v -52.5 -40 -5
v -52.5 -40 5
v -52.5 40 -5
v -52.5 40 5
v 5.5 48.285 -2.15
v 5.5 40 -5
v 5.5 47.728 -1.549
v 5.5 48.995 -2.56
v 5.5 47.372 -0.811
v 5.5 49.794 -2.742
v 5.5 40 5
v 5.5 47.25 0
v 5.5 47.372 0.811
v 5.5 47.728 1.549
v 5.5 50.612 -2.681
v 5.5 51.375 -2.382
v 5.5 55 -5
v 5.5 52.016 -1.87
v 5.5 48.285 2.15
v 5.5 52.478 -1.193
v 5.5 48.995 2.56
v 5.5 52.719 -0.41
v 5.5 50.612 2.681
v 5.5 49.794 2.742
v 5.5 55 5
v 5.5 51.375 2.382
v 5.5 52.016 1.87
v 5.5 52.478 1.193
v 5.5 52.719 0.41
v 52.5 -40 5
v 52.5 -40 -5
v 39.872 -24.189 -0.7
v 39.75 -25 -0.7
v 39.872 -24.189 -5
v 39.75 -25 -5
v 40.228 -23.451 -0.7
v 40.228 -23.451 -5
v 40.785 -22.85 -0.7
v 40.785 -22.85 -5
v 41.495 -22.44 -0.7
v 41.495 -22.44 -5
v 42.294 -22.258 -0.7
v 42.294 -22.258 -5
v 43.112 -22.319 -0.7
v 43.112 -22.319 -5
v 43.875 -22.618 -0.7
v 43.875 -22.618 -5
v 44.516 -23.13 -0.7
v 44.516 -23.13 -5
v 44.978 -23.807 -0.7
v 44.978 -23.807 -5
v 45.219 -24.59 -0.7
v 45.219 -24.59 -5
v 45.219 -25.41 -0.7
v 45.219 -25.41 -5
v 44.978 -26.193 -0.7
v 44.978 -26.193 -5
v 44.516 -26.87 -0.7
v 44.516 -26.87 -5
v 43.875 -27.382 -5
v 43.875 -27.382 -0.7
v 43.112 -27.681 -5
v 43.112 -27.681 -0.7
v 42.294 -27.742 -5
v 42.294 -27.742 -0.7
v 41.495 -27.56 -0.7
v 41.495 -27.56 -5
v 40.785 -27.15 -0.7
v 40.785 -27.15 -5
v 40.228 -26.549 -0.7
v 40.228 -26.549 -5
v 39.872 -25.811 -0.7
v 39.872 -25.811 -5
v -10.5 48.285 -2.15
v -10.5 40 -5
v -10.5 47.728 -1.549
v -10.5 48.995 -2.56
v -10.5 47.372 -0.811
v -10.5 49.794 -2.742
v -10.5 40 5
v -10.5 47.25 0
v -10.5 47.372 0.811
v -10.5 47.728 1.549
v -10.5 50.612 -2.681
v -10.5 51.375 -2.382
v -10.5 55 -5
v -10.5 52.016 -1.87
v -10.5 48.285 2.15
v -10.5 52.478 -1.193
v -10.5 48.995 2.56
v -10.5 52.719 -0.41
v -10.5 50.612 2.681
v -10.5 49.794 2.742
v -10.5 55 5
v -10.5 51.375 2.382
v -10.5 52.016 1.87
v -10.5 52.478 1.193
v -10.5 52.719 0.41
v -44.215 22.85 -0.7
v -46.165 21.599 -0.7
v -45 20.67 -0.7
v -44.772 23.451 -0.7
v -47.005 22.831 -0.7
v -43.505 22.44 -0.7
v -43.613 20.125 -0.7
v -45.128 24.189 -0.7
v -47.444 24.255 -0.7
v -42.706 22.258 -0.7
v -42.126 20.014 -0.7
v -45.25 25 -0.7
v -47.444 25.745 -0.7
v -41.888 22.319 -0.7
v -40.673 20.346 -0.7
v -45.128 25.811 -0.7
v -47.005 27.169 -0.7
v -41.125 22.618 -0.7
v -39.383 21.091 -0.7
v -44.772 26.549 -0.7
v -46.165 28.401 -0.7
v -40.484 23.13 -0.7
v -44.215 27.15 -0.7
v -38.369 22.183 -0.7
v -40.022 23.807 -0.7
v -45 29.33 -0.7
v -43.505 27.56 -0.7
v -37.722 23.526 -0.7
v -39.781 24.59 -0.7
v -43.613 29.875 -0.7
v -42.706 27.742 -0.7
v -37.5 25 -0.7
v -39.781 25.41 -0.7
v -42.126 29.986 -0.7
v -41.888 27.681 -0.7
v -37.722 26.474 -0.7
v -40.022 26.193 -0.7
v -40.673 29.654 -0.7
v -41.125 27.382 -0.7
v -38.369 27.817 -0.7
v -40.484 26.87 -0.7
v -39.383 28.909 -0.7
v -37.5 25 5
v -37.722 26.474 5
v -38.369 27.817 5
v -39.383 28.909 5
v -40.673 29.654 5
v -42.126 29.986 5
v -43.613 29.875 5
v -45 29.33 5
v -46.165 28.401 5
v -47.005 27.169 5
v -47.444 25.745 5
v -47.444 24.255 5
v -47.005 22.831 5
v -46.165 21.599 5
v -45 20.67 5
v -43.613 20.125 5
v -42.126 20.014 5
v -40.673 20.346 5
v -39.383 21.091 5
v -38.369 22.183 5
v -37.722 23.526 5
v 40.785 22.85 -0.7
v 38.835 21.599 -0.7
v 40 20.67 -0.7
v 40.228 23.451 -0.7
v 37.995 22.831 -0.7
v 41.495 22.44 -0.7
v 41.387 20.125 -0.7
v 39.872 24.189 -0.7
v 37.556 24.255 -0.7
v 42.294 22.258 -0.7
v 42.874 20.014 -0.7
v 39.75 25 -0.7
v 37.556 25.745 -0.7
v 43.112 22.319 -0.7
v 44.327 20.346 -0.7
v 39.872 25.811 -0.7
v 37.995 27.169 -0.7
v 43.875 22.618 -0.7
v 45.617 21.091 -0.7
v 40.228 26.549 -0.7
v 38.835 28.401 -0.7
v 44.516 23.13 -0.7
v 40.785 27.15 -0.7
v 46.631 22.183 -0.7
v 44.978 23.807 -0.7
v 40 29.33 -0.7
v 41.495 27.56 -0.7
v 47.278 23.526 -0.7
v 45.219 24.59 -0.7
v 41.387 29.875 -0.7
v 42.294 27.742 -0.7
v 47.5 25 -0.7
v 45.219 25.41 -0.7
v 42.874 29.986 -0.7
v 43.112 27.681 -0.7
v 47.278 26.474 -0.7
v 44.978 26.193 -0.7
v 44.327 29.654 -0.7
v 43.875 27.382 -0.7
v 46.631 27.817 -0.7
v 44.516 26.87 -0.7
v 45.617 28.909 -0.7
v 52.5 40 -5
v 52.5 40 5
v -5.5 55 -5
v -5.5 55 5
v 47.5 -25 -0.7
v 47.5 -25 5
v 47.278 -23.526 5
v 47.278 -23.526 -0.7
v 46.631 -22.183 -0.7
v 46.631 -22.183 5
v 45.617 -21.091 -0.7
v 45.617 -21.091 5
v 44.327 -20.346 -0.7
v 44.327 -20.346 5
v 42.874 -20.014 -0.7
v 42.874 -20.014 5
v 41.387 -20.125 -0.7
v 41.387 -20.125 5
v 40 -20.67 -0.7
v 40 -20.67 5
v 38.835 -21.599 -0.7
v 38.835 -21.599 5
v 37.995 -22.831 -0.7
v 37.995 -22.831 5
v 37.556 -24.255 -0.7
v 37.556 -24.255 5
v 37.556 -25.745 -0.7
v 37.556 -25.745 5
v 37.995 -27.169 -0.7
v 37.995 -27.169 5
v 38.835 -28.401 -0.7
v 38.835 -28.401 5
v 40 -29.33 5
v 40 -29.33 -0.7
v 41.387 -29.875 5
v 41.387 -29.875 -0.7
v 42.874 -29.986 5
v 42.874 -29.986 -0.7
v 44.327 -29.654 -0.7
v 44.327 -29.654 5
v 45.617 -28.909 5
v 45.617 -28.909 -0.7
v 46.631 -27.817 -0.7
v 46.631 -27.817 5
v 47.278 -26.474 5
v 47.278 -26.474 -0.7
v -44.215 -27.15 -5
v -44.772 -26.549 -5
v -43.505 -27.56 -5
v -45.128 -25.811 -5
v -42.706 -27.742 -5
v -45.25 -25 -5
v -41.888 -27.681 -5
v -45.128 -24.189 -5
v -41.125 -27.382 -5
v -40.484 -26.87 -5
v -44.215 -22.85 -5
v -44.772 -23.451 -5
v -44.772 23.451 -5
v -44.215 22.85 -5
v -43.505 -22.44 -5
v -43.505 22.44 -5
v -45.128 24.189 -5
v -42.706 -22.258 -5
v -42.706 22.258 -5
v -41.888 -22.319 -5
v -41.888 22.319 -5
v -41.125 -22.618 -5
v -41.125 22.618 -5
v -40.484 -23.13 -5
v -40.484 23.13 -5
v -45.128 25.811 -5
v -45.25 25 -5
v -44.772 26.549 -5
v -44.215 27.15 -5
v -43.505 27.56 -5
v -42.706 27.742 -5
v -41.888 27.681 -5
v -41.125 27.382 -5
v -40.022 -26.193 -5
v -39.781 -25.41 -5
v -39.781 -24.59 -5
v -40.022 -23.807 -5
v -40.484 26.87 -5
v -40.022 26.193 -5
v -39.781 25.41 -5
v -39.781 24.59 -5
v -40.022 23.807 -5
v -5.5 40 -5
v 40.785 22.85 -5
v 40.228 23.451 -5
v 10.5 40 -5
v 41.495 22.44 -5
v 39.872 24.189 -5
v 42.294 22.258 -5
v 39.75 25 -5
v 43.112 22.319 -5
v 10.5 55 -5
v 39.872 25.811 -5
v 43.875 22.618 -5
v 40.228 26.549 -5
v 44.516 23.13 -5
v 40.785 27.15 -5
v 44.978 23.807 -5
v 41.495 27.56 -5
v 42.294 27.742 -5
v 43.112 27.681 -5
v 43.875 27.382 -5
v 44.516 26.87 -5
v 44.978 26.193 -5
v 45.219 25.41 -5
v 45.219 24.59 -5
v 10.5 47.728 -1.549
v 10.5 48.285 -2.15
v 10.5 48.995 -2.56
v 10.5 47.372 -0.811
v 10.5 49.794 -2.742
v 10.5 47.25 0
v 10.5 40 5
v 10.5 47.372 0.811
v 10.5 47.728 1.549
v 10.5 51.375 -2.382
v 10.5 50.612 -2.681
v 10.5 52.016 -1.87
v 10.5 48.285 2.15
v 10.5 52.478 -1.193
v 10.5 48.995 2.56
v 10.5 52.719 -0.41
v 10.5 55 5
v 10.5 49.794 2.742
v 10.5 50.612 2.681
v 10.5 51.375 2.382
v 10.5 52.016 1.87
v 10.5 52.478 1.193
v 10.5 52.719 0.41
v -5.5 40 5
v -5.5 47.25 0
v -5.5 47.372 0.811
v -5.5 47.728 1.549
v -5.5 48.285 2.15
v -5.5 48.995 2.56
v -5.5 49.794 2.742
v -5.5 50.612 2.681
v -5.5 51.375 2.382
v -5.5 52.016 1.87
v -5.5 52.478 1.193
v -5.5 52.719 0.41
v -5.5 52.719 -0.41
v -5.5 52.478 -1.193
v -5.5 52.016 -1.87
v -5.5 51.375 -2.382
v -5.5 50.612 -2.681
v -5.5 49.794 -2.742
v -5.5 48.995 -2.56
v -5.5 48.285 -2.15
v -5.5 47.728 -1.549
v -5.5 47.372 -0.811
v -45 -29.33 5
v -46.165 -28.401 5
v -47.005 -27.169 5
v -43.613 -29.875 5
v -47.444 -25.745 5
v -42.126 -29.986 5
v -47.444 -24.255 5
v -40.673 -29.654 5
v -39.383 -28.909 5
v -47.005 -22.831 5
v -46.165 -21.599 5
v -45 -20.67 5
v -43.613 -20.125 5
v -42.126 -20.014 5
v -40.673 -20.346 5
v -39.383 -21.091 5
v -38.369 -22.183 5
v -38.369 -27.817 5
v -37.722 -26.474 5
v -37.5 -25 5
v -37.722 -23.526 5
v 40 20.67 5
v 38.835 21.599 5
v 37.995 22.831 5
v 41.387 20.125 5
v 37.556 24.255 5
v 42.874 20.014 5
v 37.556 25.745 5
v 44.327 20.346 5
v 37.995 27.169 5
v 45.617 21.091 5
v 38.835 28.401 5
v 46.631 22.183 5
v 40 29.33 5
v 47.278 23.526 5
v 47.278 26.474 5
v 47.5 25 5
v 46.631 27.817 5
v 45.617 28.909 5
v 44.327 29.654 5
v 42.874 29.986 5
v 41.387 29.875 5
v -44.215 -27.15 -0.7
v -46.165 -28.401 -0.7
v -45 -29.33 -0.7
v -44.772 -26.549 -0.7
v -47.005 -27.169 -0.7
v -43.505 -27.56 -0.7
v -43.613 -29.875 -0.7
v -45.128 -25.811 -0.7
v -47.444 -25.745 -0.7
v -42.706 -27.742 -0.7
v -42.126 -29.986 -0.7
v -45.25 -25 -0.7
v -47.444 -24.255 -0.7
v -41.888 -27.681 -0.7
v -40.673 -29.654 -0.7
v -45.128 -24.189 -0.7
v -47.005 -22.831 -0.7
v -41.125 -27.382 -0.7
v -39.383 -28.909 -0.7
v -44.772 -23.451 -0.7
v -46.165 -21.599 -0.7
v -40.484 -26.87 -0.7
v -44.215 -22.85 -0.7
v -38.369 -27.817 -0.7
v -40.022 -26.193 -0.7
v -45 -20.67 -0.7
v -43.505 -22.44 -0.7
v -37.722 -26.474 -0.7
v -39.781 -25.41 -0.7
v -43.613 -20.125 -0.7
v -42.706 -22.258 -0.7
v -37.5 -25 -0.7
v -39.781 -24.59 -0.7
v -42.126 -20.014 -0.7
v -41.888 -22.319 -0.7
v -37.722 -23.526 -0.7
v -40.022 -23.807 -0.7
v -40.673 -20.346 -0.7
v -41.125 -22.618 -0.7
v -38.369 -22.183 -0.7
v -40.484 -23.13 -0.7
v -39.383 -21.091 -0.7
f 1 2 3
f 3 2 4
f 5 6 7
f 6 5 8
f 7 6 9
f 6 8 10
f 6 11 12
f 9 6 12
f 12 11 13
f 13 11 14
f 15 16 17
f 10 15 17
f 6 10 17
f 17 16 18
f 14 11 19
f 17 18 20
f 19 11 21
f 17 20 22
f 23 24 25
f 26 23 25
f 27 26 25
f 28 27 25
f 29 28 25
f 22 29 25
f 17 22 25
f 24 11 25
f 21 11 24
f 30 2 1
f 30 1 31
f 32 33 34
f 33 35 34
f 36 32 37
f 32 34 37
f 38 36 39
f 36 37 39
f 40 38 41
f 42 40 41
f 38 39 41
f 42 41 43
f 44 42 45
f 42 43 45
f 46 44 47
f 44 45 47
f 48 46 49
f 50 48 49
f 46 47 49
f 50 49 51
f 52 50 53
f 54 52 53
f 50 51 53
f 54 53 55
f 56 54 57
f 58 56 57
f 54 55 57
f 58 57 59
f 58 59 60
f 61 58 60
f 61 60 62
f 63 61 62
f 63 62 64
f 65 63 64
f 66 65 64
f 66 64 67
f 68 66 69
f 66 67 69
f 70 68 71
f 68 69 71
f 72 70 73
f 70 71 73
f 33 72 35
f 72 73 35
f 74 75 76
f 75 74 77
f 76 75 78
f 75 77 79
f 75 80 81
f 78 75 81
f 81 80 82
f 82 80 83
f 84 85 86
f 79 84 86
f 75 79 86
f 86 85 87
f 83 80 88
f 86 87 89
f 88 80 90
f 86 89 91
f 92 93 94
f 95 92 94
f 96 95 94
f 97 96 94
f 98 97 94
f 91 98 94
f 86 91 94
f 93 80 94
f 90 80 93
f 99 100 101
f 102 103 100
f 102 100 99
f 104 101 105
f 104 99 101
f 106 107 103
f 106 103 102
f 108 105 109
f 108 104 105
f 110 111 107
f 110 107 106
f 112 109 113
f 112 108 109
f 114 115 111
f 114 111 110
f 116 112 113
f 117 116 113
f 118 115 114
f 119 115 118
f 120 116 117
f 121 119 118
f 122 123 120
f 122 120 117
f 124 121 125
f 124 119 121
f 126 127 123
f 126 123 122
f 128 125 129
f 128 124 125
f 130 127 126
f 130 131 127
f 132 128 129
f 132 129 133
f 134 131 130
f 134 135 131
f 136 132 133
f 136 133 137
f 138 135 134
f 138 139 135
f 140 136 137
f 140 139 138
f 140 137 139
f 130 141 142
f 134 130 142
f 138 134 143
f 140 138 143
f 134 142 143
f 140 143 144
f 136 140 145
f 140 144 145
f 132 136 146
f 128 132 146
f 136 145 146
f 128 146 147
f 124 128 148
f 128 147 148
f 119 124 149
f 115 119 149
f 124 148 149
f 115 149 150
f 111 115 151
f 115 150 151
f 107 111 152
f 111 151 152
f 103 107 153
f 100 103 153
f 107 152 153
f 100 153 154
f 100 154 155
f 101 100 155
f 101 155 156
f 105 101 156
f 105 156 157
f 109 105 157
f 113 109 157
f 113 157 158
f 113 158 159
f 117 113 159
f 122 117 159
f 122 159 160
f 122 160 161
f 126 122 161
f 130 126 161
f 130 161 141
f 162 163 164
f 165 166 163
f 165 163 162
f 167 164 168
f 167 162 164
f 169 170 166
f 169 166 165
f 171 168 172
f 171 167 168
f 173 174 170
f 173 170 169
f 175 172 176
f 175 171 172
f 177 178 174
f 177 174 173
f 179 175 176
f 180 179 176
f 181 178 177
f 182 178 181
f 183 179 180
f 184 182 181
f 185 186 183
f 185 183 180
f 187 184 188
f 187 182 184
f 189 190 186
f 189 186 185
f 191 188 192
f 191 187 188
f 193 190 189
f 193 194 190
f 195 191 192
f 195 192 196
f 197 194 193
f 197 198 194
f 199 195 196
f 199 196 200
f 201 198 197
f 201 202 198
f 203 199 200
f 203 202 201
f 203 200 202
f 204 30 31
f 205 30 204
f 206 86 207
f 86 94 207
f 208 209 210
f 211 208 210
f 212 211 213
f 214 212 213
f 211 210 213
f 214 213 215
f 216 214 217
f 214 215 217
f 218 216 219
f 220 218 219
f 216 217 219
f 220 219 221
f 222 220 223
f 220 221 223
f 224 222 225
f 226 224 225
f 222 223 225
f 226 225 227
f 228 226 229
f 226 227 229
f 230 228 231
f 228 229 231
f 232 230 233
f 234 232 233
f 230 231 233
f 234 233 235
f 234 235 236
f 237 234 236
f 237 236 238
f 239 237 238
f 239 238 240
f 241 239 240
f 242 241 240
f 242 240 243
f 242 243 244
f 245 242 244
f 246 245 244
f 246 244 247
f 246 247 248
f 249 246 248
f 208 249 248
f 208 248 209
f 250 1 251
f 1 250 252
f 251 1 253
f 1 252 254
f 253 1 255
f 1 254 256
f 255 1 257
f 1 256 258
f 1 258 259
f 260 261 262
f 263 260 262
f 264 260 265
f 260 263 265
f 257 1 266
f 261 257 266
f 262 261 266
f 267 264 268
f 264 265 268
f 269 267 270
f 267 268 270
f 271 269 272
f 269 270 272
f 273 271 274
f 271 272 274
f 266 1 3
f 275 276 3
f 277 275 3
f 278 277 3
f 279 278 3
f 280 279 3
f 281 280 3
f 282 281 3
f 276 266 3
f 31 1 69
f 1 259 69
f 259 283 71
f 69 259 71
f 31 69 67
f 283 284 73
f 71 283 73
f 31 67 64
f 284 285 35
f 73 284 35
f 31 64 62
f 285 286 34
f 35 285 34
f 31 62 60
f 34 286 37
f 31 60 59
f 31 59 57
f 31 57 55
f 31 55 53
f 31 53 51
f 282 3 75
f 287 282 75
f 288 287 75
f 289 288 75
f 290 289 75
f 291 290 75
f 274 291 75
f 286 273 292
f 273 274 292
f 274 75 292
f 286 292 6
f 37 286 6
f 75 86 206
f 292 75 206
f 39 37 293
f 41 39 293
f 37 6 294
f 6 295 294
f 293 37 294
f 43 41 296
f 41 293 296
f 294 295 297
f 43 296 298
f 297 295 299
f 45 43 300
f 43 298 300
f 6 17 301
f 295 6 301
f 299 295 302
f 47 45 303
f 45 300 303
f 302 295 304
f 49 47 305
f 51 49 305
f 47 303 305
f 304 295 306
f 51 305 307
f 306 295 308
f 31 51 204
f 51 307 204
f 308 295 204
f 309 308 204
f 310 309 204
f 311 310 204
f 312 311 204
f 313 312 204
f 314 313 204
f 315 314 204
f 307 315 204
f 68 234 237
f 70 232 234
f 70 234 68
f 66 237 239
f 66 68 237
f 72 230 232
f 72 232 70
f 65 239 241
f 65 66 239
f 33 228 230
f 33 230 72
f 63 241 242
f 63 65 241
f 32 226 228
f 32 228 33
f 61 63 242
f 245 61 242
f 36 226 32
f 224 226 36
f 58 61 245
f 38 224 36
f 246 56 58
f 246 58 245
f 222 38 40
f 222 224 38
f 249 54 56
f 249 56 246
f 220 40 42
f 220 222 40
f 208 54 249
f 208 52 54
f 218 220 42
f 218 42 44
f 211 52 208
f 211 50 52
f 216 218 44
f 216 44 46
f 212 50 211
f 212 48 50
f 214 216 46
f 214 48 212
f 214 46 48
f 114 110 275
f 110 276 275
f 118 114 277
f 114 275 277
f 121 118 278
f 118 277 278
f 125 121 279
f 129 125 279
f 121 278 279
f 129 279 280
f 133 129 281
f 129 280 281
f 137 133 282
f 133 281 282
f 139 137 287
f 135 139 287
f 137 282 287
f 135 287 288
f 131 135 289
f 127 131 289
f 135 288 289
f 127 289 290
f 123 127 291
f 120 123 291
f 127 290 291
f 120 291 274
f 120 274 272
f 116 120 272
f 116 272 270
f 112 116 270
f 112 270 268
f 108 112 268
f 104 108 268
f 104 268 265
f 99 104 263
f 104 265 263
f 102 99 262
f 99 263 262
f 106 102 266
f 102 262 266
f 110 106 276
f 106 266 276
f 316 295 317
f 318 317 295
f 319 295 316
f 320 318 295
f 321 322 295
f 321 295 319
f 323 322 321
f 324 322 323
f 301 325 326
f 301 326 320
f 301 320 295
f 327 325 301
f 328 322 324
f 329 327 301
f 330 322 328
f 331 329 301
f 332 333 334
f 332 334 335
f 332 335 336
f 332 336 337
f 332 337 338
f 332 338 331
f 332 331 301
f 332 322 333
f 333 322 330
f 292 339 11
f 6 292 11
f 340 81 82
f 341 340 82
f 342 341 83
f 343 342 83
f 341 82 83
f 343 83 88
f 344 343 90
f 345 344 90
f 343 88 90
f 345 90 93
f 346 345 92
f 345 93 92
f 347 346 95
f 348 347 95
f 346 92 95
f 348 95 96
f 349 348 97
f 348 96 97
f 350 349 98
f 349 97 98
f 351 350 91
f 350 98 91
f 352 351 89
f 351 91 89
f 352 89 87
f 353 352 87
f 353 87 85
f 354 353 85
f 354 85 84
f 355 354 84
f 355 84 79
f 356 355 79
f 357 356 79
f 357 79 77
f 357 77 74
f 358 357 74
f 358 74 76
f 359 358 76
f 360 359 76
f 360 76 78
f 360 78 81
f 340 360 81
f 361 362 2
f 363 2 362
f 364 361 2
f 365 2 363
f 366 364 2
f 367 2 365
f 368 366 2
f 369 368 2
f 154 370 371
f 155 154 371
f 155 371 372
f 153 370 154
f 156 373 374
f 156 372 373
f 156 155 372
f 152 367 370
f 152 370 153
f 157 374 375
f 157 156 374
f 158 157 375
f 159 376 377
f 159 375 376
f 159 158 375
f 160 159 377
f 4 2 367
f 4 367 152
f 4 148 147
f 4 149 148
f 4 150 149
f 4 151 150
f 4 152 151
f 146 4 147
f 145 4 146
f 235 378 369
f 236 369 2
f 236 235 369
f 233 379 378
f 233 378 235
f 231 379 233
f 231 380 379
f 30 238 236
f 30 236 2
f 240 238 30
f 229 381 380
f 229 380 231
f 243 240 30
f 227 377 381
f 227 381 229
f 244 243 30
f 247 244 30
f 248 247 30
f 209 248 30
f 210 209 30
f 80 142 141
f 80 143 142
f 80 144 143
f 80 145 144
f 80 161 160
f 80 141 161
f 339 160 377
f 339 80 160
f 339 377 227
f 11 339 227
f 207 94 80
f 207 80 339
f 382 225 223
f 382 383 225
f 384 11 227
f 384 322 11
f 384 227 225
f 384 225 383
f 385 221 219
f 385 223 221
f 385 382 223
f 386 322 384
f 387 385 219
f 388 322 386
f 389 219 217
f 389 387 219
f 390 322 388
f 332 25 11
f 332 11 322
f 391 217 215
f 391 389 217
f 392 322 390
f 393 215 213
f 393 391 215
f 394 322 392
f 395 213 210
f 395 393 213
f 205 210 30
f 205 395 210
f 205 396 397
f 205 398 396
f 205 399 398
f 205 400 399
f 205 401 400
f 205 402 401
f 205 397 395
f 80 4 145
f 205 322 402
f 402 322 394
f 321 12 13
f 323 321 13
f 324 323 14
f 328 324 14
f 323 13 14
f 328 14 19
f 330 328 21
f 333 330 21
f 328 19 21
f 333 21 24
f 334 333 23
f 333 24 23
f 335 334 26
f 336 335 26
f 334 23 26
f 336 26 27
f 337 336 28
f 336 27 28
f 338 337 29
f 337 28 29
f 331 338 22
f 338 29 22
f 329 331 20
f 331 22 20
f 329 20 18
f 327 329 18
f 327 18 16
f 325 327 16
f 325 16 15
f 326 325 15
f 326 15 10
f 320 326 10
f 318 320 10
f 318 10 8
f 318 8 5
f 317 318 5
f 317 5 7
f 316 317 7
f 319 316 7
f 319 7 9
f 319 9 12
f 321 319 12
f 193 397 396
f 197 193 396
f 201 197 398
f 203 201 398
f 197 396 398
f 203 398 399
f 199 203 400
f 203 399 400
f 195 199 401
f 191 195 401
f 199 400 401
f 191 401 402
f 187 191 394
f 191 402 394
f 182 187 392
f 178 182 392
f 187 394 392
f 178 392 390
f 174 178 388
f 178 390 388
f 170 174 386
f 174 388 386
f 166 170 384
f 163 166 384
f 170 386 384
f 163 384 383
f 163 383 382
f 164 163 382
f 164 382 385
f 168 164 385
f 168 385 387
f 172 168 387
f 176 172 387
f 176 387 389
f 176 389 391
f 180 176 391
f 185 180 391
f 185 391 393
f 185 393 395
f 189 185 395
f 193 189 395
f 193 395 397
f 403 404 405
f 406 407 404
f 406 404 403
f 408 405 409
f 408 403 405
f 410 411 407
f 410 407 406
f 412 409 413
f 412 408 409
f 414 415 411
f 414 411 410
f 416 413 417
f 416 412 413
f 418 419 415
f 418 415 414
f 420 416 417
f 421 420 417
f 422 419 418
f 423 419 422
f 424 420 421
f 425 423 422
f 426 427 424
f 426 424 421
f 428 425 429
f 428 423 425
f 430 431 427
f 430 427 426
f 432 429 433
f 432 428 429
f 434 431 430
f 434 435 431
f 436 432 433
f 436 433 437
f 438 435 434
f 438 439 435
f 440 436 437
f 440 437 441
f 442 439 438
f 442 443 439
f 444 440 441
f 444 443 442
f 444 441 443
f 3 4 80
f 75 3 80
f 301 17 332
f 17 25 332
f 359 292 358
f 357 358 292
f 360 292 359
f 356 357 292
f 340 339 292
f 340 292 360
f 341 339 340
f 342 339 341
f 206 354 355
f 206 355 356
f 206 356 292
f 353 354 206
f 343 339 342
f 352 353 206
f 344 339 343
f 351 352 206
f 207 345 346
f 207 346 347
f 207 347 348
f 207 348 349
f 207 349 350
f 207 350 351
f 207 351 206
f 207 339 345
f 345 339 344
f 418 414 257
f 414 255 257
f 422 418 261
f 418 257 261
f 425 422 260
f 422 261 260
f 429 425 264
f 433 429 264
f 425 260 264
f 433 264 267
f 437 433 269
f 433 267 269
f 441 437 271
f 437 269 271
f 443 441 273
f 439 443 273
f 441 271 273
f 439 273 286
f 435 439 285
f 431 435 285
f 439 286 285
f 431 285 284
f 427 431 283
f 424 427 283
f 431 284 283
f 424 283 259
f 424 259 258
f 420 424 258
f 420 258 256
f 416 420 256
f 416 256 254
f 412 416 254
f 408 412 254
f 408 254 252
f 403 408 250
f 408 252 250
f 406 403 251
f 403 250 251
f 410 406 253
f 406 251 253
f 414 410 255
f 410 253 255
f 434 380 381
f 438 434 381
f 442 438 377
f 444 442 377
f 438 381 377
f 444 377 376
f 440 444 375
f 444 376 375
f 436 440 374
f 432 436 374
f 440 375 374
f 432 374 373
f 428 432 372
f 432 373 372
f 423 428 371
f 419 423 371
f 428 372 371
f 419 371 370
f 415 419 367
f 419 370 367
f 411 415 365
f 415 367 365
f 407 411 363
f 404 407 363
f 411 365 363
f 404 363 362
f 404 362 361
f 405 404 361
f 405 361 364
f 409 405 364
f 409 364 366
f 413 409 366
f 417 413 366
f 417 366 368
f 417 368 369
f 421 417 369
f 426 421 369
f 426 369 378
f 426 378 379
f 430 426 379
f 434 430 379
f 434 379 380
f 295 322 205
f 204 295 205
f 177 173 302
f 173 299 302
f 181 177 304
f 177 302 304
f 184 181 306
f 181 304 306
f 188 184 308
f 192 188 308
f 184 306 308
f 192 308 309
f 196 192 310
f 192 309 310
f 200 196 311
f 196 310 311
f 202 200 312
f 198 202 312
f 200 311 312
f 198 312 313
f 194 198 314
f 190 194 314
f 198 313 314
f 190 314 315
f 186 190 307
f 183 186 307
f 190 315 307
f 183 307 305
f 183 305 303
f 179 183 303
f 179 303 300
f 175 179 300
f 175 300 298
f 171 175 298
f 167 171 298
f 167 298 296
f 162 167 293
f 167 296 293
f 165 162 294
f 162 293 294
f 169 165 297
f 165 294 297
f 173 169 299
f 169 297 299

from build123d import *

# Parameters (mm, degrees)
SKETCH_1_W                = 105
SKETCH_1_H                = 80
SKETCH_1_R                = 2.5
SKETCH_1_W_2              = 5
SKETCH_1_H_2              = 15
EXTRUDE_1_DEPTH           = 5
HOLE_WIZARD_1_D           = 5.5
HOLE_WIZARD_1_CBORE_D     = 10
HOLE_WIZARD_1_CBORE_DEPTH = 5.7
SKETCH_4_R                = 2.75
CUT_EXTRUDE_1_DEPTH       = 84.779472426


with BuildPart() as part:
    # 草图1 → 凸台-拉伸1 (new, symmetric)
    # profile 1 of 3: a face of its own
    with BuildSketch(Plane.XY):
        Rectangle(SKETCH_1_W, SKETCH_1_H)
        with Locations((42.5, 25)):
            Circle(SKETCH_1_R, mode=Mode.SUBTRACT)
        with Locations((-42.5, 25)):
            Circle(SKETCH_1_R, mode=Mode.SUBTRACT)
        with Locations((42.5, -25)):
            Circle(SKETCH_1_R, mode=Mode.SUBTRACT)
        with Locations((-42.5, -25)):
            Circle(SKETCH_1_R, mode=Mode.SUBTRACT)
    # profile 2 of 3: a face of its own
    with BuildSketch(Plane.XY):
        with Locations((-8, 47.5)):
            Rectangle(SKETCH_1_W_2, SKETCH_1_H_2)
    # profile 3 of 3: a face of its own
    with BuildSketch(Plane.XY):
        with Locations((8, 47.5)):
            Rectangle(SKETCH_1_W_2, SKETCH_1_H_2)
    extrude(amount=EXTRUDE_1_DEPTH, both=True)

    # 打孔尺寸(%根据)内六角圆柱头螺钉的类型1 (through all)
    with Locations(Plane.XY.offset(5)):
        with Locations((-42.5, 25), (42.5, 25), (42.5, -25), (-42.5, -25)):
            CounterBoreHole(HOLE_WIZARD_1_D / 2, HOLE_WIZARD_1_CBORE_D / 2, HOLE_WIZARD_1_CBORE_DEPTH)

    # 草图4 → 切除-拉伸1 (cut, through all)
    with BuildSketch(Plane.ZY.offset(10.5)):
        with Locations(Location((0, 50, 0), (0, 0, 270))):
            Circle(SKETCH_4_R)
    extrude(amount=-CUT_EXTRUDE_1_DEPTH, mode=Mode.SUBTRACT)


solid = part.part
